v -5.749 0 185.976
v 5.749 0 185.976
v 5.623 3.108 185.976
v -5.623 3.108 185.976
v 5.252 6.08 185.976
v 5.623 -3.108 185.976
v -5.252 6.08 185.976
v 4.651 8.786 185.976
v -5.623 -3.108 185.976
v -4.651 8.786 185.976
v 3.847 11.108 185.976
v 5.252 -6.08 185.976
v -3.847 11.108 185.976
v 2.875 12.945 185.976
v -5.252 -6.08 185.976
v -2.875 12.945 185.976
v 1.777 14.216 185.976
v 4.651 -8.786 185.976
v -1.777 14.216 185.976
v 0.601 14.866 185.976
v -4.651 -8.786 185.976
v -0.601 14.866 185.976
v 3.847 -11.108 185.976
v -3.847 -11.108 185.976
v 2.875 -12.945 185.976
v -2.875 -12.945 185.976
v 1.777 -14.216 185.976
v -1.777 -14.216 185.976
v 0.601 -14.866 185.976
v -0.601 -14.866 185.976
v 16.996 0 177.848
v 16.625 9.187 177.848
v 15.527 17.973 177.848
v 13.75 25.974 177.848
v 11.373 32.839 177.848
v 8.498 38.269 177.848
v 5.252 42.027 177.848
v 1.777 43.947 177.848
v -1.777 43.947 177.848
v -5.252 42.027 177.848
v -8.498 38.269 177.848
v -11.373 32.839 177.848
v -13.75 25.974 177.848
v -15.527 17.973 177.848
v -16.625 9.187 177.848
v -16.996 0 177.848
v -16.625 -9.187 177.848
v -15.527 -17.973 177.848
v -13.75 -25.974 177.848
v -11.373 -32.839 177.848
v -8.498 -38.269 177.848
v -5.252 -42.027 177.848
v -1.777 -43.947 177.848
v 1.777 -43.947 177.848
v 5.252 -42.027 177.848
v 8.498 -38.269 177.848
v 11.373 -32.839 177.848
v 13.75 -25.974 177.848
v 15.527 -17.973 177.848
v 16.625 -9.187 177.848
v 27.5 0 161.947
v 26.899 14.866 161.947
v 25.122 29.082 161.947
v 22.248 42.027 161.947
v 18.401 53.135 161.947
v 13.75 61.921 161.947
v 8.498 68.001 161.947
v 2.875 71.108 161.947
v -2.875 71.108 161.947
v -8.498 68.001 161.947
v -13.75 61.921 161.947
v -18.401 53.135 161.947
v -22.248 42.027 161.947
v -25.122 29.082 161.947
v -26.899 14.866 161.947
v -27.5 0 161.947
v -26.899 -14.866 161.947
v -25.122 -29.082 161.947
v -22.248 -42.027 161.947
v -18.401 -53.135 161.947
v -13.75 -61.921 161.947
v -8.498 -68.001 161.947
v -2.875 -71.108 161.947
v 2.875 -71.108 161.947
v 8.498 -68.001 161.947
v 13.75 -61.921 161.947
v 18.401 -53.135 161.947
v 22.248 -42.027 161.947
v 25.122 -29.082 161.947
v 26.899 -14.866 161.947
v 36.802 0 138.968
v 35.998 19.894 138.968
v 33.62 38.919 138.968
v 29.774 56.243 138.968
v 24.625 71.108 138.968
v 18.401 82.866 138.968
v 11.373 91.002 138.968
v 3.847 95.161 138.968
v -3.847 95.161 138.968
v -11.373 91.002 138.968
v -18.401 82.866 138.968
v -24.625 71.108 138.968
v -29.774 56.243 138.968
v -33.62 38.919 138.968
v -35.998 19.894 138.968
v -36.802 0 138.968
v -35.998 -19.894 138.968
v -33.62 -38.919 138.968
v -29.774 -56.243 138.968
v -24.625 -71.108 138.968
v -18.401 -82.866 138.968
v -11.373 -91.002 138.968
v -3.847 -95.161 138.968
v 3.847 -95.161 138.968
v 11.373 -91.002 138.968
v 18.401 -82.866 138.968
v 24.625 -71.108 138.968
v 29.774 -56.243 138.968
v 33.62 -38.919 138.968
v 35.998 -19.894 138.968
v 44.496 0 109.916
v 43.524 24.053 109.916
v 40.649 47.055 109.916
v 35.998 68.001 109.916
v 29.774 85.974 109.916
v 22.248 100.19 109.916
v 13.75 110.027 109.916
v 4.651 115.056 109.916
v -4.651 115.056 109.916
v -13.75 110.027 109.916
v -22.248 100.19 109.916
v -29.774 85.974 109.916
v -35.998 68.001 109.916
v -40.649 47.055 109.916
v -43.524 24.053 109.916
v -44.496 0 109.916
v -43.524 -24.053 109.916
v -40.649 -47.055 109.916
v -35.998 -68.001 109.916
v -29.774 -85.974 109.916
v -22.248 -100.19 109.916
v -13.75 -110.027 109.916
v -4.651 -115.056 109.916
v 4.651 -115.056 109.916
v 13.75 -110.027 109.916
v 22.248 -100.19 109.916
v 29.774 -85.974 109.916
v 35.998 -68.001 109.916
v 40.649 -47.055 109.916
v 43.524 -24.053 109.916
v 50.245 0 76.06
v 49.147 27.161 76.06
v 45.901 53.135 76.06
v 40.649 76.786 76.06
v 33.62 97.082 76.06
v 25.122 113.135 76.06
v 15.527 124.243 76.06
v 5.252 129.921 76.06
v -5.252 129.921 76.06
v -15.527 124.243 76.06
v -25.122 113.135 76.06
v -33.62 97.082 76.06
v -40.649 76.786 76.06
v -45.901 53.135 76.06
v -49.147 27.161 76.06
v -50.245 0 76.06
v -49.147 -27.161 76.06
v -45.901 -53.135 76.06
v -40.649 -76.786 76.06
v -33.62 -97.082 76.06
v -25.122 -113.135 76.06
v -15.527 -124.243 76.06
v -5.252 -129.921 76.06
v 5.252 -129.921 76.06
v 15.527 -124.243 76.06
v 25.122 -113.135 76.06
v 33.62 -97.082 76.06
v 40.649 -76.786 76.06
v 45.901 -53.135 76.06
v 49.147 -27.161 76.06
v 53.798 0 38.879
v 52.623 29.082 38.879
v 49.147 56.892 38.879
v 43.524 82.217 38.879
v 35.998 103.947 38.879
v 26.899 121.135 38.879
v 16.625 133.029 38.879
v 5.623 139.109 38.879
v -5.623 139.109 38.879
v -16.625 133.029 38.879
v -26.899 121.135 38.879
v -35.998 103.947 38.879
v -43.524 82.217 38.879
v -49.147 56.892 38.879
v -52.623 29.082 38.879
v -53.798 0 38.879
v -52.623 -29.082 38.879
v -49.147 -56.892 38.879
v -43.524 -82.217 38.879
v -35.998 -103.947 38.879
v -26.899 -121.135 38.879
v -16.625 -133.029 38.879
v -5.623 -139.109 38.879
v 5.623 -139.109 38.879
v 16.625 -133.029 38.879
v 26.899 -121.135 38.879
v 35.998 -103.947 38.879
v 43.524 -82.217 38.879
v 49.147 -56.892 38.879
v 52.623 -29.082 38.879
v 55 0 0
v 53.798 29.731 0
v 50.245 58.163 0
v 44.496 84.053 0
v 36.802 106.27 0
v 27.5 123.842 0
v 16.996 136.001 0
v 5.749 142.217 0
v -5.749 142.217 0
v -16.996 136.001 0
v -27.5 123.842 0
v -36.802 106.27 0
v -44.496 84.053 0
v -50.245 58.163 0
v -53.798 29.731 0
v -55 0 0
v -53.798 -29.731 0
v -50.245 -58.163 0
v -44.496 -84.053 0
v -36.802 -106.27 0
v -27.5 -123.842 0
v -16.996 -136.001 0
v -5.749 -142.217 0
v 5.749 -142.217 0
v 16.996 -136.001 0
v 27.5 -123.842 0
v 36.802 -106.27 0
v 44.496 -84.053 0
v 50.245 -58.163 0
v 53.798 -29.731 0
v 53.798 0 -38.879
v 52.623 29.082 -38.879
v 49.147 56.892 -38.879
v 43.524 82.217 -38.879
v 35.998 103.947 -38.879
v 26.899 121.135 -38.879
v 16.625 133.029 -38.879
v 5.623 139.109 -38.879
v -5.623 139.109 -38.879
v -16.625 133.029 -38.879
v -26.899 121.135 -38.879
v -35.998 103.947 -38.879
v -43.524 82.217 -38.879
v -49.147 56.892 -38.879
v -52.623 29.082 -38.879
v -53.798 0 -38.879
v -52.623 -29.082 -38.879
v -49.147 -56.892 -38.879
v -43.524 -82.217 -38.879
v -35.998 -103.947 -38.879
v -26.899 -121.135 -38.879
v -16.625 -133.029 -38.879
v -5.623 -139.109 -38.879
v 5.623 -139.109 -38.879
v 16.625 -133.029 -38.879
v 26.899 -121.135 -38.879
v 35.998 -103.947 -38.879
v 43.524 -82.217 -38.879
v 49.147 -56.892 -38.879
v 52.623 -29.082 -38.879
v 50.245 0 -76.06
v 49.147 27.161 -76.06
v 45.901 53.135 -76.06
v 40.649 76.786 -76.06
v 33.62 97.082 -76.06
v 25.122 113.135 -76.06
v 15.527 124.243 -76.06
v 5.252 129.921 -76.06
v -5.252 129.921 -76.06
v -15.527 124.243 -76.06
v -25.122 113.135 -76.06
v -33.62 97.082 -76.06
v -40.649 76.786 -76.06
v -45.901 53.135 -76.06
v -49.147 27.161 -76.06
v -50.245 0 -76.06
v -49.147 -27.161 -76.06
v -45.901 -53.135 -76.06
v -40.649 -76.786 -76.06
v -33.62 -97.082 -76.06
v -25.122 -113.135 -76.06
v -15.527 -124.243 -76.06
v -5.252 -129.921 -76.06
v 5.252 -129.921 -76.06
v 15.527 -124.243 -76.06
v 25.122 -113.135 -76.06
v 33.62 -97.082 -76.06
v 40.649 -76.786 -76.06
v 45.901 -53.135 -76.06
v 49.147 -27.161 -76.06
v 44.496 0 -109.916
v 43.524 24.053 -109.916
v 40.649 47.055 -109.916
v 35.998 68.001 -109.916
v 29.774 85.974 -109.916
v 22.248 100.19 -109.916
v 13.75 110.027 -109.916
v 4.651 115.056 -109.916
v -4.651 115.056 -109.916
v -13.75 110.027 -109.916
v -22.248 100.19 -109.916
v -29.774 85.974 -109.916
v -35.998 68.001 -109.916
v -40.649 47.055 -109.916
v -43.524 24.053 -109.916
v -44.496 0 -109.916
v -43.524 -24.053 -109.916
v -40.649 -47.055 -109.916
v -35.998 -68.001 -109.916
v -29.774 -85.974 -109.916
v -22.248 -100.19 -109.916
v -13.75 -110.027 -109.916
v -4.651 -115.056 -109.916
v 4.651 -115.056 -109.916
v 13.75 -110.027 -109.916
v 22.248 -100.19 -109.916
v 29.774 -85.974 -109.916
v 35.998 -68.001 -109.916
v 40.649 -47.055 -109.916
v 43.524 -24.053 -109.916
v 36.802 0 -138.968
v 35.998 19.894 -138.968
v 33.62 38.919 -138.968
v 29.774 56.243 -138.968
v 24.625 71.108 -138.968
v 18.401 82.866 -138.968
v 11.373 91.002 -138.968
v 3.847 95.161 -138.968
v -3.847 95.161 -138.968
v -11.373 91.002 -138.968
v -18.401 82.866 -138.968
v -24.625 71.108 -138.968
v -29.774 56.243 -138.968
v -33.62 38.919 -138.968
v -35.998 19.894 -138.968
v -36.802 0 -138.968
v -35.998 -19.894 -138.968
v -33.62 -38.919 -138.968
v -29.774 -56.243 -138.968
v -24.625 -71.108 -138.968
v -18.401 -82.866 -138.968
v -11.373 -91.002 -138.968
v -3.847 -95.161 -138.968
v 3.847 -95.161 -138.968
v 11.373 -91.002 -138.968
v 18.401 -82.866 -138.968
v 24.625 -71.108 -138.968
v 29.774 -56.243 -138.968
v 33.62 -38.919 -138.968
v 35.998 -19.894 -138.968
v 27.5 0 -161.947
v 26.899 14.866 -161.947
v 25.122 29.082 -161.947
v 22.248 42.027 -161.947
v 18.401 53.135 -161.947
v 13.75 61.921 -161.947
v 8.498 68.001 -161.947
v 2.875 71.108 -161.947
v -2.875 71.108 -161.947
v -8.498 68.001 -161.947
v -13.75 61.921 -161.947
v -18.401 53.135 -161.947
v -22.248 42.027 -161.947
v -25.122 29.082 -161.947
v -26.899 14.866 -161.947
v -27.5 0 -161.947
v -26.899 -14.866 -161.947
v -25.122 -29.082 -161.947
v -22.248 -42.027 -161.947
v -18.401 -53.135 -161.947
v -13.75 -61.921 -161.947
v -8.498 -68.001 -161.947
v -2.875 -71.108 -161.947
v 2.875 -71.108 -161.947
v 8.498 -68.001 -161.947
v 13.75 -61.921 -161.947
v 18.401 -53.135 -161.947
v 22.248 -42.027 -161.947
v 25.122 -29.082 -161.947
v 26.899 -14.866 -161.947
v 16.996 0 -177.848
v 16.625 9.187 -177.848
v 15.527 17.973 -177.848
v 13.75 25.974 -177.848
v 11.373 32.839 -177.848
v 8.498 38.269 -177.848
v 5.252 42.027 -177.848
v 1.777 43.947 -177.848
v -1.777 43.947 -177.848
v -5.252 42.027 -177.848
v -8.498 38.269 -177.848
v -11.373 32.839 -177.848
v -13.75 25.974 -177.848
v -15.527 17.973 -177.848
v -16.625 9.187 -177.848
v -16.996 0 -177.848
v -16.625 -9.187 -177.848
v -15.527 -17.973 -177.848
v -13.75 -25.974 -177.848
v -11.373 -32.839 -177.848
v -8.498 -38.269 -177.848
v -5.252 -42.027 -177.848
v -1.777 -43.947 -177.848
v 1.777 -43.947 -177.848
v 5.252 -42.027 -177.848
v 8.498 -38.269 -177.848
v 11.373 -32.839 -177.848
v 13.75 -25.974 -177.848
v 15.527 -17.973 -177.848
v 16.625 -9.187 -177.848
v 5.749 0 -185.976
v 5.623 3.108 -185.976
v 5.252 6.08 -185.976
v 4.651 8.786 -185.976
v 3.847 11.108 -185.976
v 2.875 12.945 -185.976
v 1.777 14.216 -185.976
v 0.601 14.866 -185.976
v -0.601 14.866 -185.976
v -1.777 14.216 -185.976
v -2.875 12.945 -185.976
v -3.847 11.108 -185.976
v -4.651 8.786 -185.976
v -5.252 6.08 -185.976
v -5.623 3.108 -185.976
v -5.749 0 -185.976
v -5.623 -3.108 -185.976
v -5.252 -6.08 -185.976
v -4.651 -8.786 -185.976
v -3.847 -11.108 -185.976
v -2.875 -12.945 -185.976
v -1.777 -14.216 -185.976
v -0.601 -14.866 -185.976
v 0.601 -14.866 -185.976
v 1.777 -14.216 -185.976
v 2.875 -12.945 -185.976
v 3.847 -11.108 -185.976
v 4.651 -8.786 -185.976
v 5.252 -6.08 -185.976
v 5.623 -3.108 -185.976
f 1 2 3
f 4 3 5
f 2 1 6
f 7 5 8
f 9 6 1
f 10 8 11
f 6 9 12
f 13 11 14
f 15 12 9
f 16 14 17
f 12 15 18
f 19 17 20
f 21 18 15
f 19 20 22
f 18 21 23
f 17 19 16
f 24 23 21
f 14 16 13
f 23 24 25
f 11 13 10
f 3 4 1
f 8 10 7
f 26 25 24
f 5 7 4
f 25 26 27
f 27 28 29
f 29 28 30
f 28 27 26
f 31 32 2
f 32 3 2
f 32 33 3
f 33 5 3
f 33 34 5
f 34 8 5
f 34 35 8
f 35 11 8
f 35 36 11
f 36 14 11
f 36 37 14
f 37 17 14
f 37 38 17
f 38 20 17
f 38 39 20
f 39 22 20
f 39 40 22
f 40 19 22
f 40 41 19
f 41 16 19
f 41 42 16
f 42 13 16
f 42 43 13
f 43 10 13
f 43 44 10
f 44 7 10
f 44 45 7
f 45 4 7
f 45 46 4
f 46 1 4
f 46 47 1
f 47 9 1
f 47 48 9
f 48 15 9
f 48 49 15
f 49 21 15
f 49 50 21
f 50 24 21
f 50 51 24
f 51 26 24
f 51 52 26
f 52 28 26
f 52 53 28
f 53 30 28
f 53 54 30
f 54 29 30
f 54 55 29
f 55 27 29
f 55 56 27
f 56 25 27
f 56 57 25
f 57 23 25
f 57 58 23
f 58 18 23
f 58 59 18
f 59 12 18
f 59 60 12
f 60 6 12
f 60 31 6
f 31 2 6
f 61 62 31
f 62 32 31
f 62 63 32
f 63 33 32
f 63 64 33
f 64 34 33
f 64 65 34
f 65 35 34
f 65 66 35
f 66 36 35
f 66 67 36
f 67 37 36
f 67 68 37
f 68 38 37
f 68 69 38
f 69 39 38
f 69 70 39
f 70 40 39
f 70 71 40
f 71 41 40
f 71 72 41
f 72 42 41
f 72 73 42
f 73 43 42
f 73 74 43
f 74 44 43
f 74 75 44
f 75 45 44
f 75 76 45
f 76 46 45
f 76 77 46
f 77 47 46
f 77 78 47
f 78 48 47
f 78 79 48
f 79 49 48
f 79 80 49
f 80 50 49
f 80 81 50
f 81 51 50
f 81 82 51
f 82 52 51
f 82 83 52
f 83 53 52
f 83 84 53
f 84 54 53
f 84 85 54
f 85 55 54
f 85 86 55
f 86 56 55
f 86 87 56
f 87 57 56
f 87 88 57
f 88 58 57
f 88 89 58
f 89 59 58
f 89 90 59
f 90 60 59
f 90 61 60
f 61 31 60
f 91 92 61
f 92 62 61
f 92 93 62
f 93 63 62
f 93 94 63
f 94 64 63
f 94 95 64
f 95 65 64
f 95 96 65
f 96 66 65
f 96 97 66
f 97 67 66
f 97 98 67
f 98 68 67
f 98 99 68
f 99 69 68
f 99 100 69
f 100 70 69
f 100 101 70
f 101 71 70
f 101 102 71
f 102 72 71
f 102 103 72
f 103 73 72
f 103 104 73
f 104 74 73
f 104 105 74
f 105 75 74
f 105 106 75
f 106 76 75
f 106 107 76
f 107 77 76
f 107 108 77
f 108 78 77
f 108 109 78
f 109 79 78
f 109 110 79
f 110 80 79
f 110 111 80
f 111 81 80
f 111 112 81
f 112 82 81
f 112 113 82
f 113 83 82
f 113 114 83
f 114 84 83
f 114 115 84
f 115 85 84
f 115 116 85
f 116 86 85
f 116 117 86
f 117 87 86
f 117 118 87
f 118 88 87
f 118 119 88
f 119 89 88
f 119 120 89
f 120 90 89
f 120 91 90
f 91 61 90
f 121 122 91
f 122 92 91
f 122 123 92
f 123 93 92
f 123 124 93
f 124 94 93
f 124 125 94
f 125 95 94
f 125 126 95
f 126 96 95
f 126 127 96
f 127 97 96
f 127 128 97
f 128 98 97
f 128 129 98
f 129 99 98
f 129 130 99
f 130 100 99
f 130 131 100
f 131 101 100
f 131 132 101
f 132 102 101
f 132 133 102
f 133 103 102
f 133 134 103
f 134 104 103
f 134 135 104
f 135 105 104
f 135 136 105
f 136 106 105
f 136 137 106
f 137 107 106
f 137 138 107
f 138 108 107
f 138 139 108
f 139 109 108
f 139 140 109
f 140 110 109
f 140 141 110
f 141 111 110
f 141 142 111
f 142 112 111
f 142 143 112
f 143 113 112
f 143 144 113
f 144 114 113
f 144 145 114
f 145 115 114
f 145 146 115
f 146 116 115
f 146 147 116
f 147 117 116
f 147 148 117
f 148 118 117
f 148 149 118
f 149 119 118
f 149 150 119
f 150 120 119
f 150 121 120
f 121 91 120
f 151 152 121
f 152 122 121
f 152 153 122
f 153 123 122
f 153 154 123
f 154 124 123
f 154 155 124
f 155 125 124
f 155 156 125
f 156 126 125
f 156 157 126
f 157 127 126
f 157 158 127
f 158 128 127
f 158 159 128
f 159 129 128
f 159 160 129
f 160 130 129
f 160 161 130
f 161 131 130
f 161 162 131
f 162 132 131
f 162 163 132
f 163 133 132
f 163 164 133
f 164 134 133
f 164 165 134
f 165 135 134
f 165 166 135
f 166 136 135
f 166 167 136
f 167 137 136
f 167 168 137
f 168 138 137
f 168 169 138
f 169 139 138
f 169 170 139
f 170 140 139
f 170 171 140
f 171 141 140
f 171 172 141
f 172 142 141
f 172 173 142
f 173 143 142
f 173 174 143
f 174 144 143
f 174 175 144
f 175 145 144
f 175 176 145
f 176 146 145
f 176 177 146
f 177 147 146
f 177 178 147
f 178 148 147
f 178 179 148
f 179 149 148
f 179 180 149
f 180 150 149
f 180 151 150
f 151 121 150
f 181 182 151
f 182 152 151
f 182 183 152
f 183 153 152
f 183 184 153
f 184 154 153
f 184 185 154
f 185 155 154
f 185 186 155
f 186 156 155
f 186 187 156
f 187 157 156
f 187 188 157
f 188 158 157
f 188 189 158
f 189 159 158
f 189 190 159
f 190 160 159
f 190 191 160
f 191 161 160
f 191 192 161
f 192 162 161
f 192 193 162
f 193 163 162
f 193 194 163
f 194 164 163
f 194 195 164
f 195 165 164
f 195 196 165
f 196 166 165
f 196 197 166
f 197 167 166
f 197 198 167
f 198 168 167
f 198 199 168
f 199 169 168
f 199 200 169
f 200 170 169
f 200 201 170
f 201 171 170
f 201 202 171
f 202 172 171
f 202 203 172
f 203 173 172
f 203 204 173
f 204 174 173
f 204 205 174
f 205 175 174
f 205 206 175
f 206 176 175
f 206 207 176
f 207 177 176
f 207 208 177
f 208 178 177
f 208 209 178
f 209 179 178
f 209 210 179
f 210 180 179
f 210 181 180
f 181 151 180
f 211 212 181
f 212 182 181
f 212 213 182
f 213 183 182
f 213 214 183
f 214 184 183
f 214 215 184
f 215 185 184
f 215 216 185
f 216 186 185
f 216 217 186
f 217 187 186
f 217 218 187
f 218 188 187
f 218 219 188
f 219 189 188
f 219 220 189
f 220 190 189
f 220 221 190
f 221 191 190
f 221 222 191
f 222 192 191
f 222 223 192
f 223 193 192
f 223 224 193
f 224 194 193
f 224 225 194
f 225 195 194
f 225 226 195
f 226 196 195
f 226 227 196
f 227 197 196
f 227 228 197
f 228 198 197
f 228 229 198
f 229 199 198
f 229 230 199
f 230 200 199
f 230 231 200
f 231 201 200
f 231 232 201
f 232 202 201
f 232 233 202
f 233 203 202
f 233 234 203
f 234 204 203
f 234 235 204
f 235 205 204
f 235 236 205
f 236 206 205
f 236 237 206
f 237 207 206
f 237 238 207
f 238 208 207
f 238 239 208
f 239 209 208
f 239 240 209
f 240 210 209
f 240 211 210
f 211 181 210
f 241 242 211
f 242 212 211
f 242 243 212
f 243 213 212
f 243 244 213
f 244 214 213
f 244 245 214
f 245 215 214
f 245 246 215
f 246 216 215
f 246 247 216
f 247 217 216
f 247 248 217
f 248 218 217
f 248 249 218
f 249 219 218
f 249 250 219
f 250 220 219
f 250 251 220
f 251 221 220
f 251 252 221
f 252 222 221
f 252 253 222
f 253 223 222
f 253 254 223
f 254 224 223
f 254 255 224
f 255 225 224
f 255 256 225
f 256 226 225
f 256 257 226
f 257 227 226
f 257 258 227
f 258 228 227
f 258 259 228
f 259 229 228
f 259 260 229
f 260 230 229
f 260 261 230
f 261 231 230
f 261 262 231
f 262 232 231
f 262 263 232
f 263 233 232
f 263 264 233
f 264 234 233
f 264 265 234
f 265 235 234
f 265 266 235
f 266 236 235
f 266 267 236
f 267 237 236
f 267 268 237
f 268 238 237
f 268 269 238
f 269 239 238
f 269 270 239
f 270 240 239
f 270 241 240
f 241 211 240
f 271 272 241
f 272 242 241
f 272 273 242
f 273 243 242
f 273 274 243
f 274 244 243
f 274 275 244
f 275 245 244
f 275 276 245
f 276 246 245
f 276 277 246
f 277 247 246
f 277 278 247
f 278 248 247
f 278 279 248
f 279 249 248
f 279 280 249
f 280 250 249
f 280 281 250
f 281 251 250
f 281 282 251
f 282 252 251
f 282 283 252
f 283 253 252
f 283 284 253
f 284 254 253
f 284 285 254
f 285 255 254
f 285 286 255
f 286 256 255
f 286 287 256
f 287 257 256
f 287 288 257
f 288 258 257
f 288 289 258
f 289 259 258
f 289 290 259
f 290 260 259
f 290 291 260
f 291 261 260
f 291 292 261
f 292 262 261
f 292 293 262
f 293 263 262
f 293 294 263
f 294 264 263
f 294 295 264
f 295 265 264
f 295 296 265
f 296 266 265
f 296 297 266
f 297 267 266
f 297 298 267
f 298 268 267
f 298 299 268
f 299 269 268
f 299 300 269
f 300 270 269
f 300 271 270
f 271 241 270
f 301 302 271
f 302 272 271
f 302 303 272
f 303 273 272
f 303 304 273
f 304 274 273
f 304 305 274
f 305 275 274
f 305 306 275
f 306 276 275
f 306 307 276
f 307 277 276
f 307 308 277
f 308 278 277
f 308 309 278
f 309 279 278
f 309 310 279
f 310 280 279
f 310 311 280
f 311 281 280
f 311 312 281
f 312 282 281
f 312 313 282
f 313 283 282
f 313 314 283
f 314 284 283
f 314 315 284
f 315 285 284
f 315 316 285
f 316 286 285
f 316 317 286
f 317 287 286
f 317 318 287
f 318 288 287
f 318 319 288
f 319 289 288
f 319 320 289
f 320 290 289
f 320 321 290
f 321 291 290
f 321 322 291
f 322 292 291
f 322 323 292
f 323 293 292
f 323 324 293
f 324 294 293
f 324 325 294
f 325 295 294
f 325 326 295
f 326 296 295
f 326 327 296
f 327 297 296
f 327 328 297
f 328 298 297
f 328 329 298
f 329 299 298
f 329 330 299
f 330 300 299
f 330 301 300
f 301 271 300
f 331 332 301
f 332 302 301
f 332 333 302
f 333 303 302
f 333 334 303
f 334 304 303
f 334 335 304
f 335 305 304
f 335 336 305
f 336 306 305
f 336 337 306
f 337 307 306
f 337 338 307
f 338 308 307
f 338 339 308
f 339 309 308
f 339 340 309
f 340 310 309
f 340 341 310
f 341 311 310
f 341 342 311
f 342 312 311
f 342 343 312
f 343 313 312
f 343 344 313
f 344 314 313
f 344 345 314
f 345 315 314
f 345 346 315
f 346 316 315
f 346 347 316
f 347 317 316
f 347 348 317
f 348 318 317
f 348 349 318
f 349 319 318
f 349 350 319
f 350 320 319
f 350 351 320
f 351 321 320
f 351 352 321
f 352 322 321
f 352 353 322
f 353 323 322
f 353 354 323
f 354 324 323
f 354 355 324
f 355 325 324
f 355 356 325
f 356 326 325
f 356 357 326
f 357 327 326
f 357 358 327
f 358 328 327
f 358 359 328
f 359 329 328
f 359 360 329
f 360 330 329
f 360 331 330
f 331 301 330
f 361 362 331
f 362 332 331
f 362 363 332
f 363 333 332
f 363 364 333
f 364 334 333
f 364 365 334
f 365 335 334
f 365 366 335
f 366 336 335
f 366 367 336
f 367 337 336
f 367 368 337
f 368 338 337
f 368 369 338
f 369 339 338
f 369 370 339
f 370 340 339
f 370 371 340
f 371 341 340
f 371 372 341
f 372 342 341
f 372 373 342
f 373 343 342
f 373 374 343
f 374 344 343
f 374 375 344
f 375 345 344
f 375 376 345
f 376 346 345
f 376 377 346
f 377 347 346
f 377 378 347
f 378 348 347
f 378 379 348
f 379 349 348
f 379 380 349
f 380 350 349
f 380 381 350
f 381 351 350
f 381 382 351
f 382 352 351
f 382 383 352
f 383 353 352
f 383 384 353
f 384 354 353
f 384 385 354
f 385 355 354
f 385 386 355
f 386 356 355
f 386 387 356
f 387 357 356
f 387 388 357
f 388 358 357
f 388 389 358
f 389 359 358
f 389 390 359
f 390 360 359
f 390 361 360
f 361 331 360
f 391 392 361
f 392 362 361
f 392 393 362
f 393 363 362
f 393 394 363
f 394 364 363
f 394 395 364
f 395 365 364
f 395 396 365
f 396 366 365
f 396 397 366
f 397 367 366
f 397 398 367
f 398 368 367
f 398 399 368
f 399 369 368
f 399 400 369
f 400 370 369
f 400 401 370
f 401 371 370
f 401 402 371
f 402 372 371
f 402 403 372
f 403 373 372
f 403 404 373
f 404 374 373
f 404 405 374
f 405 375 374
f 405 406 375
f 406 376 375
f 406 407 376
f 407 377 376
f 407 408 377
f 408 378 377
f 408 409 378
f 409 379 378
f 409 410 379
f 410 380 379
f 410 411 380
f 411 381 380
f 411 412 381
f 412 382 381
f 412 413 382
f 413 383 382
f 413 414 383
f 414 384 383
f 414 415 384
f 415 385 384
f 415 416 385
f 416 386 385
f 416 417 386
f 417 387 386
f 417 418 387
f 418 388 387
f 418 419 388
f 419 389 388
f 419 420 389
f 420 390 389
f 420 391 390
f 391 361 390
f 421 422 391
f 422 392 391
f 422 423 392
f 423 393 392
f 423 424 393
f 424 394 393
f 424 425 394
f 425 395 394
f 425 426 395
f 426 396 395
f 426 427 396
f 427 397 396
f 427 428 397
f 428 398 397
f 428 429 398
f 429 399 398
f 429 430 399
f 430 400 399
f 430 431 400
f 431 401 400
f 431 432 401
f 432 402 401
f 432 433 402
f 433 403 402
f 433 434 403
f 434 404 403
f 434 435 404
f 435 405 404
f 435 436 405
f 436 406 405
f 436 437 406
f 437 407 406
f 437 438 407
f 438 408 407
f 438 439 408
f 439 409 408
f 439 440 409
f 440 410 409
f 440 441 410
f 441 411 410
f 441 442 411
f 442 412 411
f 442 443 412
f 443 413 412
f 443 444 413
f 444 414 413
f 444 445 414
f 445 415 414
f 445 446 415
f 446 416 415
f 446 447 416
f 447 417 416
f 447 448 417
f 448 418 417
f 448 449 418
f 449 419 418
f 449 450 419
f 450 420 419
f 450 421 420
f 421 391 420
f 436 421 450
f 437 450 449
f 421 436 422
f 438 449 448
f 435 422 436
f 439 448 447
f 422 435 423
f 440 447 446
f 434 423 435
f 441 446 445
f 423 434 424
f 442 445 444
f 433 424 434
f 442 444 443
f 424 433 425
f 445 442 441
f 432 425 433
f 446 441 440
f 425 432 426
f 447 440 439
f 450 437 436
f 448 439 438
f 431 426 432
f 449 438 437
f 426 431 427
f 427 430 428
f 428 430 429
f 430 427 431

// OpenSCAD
// Generated by SolidPython 1.0.1 on 2020-07-29 00:46:46


scale(v = [5, 13, 17]) {
	sphere(r = 11);
}
/***********************************************
*********      SolidPython code:      **********
************************************************
 
# import packages: SolidPython
from solid import *
from solid.utils import *
from itertools import chain, combinations, permutations


class Resize:

    def __init__(self, scad_file):
        self.scad_file = scad_file
        #self.scad_file = import_scad(scad_file)
        # cone/cylinder param:
        self.r1 = 0
        self.r2 = 0
        self.h = 0
        # rectangular prism param:
        self.w = 0
        self.l = 0
        # ellipse param:
        self.r = 0

    # import OpenScad code (file name corresponds to shape)


    # classify shape + parameters
    def assign(self, param1, param2, param3):
        if self.scad_file == 'cone.scad':
            self.r1 = param1
            self.r2 = param2
            self.h = param3
        elif self.scad_file == 'cylinder.scad':
            self.r1 = param1
            self.r2 = param2
            self.h = param3
        elif self.scad_file == 'rectangularPrism.scad':
            self.h = param1
            self.l = param2
            self.w = param3
        else:
            self.r = param1
            self.h = param2

    # resize parameters
    def iterate(self):
        x = range(3, 20, 2)
        i = 1
        if self.scad_file == 'cone.scad':
            tempList = list(permutations(x, 2))
            for temp in tempList:
                param1 = temp[0]
                param2 = temp[1]
                filepath = 'produced_scad_files/' + 'cone' + str(param1) + '_' + str(param2) + '_' + '.scad'
                scad_render_to_file(cylinder(h=param1, r1=param2, r2=0), filepath)

        elif self.scad_file == 'cylinder.scad':
            tempList = list(permutations(x, 3))
            for temp in tempList:
                param1 = temp[0]
                param2 = temp[1]
                filepath = 'produced_scad_files/' + 'cylinder' + str(param1) + '_' + str(param2) + '_' + '.scad'
                scad_render_to_file(cylinder(h=param1, r1=param2, r2=param2), filepath)

        elif self.scad_file == 'rectangularPrism.scad':
            tempList = list(permutations(x, 3))
            for temp in tempList:
                param1 = temp[0]
                param2 = temp[1]
                param3 = temp[2]
                filepath = 'produced_scad_files/' + 'rectangularPrism' + str(param1) + '_' + str(param2) + '_' + str(
                    param3) + '.scad'
                scad_render_to_file(cube(size=(param1, param2, param3)), filepath)

        elif self.scad_file == 'ellipse.scad':
            tempList = list(permutations(x, 4))
            for temp in tempList:
                param1 = temp[0]
                param2 = temp[1]
                param3 = temp[2]
                param4 = temp[3]
                filepath = 'produced_scad_files/' + 'ellipse' + str(param1) + '_' + str(param2) + '_' + str(param3) + '_' + str(param4) + '.scad'
                scad_render_to_file(scale([param1, param2, param3])(sphere(r=param4)), filepath)

    def render_to_scadfile(self):
        scad_render_to_file(scad, 'example.scad') 
 
************************************************/
